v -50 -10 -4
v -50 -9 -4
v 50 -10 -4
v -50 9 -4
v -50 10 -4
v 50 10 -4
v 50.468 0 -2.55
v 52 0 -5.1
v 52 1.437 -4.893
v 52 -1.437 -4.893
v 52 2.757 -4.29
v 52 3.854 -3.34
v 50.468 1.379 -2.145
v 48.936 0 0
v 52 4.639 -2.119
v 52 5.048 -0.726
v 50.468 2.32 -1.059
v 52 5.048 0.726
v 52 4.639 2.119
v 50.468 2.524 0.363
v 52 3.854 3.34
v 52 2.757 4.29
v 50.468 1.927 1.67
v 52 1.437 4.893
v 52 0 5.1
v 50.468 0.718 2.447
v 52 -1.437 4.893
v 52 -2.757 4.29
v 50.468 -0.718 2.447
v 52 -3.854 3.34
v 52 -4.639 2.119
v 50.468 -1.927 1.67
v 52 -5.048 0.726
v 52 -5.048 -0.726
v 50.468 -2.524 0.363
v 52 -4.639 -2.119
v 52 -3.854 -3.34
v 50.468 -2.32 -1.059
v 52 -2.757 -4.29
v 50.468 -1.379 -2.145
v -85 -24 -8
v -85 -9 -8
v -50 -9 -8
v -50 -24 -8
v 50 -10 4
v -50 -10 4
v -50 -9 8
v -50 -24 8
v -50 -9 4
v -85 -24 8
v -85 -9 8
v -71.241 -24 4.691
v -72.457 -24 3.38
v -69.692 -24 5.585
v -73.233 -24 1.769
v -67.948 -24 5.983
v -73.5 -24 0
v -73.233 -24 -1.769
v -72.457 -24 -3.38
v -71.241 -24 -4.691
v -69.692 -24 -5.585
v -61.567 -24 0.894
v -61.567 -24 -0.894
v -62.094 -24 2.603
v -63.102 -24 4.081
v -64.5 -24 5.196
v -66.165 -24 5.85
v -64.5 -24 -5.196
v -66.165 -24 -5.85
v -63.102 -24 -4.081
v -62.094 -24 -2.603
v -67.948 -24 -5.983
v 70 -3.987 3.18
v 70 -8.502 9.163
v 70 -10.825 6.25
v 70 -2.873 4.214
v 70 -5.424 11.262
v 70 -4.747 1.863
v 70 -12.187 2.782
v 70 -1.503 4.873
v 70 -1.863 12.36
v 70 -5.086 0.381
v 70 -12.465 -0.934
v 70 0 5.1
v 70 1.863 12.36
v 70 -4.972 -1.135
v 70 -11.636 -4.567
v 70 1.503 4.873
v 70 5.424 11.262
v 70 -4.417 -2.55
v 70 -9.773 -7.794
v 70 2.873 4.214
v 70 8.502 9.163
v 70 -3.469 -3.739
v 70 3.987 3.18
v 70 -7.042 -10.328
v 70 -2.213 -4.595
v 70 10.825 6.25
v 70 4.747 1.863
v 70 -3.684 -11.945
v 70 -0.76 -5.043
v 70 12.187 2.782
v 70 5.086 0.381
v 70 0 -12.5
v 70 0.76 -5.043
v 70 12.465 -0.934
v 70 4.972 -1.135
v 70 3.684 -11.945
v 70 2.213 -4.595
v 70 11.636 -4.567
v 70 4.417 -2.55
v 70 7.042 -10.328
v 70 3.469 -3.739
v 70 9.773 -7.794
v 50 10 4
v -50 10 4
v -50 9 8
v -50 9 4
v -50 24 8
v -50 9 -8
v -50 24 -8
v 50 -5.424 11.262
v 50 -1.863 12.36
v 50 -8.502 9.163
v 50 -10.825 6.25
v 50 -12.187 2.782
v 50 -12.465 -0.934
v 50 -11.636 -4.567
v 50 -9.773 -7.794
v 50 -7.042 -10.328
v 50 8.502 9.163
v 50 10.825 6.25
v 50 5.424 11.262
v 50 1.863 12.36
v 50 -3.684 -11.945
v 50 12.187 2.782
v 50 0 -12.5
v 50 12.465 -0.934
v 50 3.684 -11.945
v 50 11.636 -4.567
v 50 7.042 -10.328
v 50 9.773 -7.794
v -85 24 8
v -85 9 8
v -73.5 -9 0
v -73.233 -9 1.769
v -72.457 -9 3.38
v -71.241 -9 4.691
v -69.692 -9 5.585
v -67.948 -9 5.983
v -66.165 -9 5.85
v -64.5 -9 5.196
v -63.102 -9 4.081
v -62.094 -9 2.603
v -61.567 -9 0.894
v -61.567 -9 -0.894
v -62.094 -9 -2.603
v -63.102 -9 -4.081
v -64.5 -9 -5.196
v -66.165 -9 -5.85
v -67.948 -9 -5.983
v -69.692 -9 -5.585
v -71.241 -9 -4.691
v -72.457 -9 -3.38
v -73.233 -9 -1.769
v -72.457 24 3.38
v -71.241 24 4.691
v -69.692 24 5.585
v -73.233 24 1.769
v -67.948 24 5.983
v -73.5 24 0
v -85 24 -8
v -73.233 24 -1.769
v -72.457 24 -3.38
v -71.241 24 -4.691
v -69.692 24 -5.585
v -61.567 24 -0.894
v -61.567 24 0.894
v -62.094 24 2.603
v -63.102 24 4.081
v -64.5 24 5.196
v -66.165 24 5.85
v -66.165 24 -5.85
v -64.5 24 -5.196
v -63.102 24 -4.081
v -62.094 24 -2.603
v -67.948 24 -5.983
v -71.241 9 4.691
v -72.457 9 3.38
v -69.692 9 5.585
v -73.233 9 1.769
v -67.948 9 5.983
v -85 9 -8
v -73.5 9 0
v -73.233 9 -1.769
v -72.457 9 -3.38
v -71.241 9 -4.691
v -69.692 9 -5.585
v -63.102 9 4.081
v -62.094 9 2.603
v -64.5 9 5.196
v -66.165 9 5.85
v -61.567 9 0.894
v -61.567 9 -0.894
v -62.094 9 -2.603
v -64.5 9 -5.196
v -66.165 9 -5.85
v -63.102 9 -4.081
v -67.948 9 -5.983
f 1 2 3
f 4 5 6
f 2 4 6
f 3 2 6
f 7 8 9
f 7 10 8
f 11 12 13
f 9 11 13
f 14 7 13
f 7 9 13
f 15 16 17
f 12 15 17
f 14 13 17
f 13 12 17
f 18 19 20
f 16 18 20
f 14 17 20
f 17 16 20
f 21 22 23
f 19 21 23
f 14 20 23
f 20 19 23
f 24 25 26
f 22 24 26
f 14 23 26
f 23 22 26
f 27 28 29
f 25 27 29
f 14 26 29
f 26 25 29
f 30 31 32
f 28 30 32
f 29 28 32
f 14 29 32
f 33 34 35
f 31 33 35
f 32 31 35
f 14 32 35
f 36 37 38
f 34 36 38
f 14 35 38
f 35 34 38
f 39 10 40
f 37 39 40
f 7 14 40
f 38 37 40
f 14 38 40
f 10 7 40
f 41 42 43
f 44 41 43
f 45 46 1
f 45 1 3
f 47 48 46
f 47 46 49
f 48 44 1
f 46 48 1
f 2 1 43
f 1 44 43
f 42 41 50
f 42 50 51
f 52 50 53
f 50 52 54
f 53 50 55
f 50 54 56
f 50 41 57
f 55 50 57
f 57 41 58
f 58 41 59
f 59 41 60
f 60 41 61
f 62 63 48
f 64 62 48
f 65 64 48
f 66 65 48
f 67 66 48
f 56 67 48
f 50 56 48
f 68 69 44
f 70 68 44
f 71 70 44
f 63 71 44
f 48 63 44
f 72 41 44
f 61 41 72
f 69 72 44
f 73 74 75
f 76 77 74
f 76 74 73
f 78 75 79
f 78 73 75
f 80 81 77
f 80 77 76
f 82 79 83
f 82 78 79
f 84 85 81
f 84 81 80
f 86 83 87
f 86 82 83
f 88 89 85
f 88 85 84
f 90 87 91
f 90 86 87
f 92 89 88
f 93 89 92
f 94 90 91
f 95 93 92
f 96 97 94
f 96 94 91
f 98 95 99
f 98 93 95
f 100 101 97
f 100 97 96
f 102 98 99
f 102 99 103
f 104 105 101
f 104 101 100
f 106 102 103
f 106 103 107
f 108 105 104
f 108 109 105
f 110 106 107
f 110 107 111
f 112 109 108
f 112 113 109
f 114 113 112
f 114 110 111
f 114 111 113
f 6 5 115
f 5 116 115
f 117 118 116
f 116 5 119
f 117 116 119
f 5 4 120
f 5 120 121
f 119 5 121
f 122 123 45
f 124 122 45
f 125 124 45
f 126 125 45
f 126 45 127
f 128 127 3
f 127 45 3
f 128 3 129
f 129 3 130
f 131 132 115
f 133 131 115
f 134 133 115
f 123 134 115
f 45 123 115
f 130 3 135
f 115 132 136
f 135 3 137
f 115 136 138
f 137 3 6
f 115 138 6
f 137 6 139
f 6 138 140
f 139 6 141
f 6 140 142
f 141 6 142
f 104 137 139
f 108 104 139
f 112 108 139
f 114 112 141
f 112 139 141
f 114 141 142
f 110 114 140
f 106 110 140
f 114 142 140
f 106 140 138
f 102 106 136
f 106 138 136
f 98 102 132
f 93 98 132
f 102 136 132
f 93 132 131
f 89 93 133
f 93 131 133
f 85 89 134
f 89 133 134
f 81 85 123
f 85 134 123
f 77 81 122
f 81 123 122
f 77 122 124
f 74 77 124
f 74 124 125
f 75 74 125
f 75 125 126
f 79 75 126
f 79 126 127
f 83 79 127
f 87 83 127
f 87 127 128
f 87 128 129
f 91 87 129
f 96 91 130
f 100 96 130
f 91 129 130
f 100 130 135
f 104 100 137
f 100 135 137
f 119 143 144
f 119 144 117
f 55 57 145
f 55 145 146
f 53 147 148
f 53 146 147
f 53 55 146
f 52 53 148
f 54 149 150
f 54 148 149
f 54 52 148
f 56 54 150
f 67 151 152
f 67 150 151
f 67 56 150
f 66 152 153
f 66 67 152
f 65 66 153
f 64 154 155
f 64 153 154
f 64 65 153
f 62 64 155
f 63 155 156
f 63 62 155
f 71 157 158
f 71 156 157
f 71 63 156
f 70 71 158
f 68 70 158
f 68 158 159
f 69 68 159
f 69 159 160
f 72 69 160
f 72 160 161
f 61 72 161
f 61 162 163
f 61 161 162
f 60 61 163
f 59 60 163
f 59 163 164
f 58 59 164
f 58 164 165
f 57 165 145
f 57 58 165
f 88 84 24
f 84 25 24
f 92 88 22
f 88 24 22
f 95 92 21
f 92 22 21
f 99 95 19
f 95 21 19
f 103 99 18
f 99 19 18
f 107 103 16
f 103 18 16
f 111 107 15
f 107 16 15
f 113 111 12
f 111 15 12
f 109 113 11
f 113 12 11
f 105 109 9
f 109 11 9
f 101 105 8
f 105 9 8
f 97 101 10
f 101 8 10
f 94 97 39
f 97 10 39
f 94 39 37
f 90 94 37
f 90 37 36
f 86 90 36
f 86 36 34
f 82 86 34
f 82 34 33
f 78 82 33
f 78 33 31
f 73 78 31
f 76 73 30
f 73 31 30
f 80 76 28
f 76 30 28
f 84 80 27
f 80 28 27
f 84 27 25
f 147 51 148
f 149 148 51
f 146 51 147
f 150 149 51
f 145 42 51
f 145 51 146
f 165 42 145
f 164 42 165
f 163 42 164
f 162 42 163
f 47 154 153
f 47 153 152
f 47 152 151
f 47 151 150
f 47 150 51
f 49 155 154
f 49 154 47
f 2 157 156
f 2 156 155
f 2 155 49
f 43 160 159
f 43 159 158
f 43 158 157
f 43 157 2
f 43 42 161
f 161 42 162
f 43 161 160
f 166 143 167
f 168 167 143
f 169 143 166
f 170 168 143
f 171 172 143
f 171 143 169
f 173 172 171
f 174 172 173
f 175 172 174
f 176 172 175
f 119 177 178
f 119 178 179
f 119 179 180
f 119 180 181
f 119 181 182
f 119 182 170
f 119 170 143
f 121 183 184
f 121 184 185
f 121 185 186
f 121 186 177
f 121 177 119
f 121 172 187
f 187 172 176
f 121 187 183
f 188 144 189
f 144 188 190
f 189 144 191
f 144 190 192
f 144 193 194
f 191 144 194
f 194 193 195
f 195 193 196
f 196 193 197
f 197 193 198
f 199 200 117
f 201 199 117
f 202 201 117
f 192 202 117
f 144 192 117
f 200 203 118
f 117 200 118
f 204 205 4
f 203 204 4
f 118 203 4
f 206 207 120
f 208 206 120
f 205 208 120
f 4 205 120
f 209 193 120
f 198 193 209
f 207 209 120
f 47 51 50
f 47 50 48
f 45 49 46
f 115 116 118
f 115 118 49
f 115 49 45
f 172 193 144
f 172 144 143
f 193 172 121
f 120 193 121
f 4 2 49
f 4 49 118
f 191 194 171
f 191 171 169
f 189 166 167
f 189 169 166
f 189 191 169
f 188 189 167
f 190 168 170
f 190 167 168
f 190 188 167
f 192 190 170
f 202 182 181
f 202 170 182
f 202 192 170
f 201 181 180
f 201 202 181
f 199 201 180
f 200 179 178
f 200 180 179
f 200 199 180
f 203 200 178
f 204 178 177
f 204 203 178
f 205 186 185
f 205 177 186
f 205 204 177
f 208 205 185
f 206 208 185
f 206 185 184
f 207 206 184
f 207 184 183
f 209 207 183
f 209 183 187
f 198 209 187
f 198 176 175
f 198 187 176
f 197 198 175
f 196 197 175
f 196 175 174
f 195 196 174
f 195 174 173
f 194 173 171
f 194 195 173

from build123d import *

# Parameters (mm, degrees)
ESQUISSE1_W                  = 100
ESQUISSE1_H                  = 20
BOSS_EXTRU_1_DEPTH           = 4
BOSS_EXTRU_2_DEPTH           = 4
BOSS_EXTRU_2_DEPTH_BACK      = 12
ESQUISSE2_W                  = 35
ESQUISSE2_H                  = 48
ENL_V_MAT_EXTRU_1_DEPTH      = 90.134729483
ENL_V_MAT_EXTRU_1_DEPTH_BACK = 90.134729483
ESQUISSE3_W                  = 35
ESQUISSE3_H                  = 18
ENL_V_MAT_EXTRU_2_DEPTH      = 98.943861472
ENL_V_MAT_EXTRU_2_DEPTH_BACK = 98.943861472
ESQUISSE6_R                  = 6
ESQUISSE7_R                  = 12.5
BOSS_EXTRU_3_DEPTH           = 20
M12_TAPPED_HOLE1_D           = 10.2
M12_TAPPED_HOLE1_DEPTH       = 18
M12_TAPPED_HOLE1_TIP         = 3.064389157


with BuildPart() as part:
    # Esquisse1 → Boss.-Extru.1 (new, symmetric)
    with BuildSketch(Plane.XY):
        Rectangle(ESQUISSE1_W, ESQUISSE1_H)
    extrude(amount=BOSS_EXTRU_1_DEPTH, both=True)

    # Esquisse2 → Boss.-Extru.2 (add, two sides: drawn at the far end of the back side and taken through both)
    with BuildSketch(Plane.XY.offset(4).offset(-BOSS_EXTRU_2_DEPTH_BACK)):
        with Locations((-67.5, 0)):
            Rectangle(ESQUISSE2_W, ESQUISSE2_H)
    extrude(amount=BOSS_EXTRU_2_DEPTH + BOSS_EXTRU_2_DEPTH_BACK)

    # Esquisse3 → Enlèv. mat.-Extru.1 (cut, two sides: drawn at the far end of the back side and taken through both)
    with BuildSketch(Plane.XY.offset(4).offset(-ENL_V_MAT_EXTRU_1_DEPTH_BACK)):
        with Locations((-67.5, 0)):
            Rectangle(ESQUISSE3_W, ESQUISSE3_H)
    extrude(amount=ENL_V_MAT_EXTRU_1_DEPTH + ENL_V_MAT_EXTRU_1_DEPTH_BACK, mode=Mode.SUBTRACT)

    # Esquisse6 → Enlèv. mat.-Extru.2 (cut, two sides: drawn at the far end of the back side and taken through both)
    with BuildSketch(Plane(origin=(0, 24, 0), x_dir=(1, 0, 0), z_dir=(0, 1, 0)).offset(-ENL_V_MAT_EXTRU_2_DEPTH_BACK)):
        with Locations((-67.5, 0)):
            Circle(ESQUISSE6_R)
    extrude(amount=ENL_V_MAT_EXTRU_2_DEPTH + ENL_V_MAT_EXTRU_2_DEPTH_BACK, mode=Mode.SUBTRACT)

    # Esquisse7 → Boss.-Extru.3 (add)
    with BuildSketch(Plane(origin=(50, 0, 0), x_dir=(0, 0, -1), z_dir=(1, 0, 0))):
        Circle(ESQUISSE7_R)
    extrude(amount=BOSS_EXTRU_3_DEPTH)

    # M12 Tapped Hole1
    with Locations(Plane(origin=(70, 0, 0), x_dir=(0, 0, -1), z_dir=(1, 0, 0))):
        with Locations((0, 0)):
            Hole(M12_TAPPED_HOLE1_D / 2, depth=M12_TAPPED_HOLE1_DEPTH)
            with Locations((0, 0, -(M12_TAPPED_HOLE1_DEPTH + M12_TAPPED_HOLE1_TIP / 2))):  # 118° drill point
                Cone(0, M12_TAPPED_HOLE1_D / 2, M12_TAPPED_HOLE1_TIP, mode=Mode.SUBTRACT)


solid = part.part
